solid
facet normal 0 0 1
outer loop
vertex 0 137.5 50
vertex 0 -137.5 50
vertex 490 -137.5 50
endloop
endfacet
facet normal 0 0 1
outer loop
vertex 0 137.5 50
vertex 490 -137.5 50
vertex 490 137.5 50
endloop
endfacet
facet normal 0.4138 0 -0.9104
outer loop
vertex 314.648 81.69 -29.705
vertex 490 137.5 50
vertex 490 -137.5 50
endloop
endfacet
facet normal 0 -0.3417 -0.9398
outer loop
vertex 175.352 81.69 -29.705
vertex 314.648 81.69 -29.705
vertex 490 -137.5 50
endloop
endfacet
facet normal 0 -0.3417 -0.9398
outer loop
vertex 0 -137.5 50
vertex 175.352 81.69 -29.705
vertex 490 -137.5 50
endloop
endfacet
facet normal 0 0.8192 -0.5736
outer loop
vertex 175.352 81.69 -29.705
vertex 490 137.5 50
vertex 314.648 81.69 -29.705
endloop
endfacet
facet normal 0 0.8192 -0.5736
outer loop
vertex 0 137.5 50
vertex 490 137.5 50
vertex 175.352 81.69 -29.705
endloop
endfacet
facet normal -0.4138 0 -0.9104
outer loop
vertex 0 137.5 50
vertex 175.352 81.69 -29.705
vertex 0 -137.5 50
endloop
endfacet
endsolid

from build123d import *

# Parameters (mm, degrees)
F0_W     = 275
F0_H     = 100
F1_DEPTH = 490
F3_DEPTH = 275.001
F5_DEPTH = 490.001


with BuildPart() as f1:
    # F0 (on Right) → F1 (new body)
    with BuildSketch(Plane.YZ):
        Rectangle(F0_W, F0_H)
    extrude(amount=F1_DEPTH)

    # F2 (on face) → F3 (cut, through all)
    with BuildSketch(Plane.XZ.offset(137.5)):
        Polygon((0, 50), (0, -50), (220, -50), align=None)
        Polygon((490, 50), (270, -50), (490, -50), align=None)
    extrude(amount=-F3_DEPTH, mode=Mode.SUBTRACT)

    # F4 (on Right) → F5 (cut, through all)
    with BuildSketch(Plane.YZ):
        Polygon((137.5, 50), (81.689713, -29.70535), (-137.5, 50), (-137.5, -50), (137.5, -50), align=None)
    extrude(amount=F5_DEPTH, mode=Mode.SUBTRACT)


solid = f1.part
